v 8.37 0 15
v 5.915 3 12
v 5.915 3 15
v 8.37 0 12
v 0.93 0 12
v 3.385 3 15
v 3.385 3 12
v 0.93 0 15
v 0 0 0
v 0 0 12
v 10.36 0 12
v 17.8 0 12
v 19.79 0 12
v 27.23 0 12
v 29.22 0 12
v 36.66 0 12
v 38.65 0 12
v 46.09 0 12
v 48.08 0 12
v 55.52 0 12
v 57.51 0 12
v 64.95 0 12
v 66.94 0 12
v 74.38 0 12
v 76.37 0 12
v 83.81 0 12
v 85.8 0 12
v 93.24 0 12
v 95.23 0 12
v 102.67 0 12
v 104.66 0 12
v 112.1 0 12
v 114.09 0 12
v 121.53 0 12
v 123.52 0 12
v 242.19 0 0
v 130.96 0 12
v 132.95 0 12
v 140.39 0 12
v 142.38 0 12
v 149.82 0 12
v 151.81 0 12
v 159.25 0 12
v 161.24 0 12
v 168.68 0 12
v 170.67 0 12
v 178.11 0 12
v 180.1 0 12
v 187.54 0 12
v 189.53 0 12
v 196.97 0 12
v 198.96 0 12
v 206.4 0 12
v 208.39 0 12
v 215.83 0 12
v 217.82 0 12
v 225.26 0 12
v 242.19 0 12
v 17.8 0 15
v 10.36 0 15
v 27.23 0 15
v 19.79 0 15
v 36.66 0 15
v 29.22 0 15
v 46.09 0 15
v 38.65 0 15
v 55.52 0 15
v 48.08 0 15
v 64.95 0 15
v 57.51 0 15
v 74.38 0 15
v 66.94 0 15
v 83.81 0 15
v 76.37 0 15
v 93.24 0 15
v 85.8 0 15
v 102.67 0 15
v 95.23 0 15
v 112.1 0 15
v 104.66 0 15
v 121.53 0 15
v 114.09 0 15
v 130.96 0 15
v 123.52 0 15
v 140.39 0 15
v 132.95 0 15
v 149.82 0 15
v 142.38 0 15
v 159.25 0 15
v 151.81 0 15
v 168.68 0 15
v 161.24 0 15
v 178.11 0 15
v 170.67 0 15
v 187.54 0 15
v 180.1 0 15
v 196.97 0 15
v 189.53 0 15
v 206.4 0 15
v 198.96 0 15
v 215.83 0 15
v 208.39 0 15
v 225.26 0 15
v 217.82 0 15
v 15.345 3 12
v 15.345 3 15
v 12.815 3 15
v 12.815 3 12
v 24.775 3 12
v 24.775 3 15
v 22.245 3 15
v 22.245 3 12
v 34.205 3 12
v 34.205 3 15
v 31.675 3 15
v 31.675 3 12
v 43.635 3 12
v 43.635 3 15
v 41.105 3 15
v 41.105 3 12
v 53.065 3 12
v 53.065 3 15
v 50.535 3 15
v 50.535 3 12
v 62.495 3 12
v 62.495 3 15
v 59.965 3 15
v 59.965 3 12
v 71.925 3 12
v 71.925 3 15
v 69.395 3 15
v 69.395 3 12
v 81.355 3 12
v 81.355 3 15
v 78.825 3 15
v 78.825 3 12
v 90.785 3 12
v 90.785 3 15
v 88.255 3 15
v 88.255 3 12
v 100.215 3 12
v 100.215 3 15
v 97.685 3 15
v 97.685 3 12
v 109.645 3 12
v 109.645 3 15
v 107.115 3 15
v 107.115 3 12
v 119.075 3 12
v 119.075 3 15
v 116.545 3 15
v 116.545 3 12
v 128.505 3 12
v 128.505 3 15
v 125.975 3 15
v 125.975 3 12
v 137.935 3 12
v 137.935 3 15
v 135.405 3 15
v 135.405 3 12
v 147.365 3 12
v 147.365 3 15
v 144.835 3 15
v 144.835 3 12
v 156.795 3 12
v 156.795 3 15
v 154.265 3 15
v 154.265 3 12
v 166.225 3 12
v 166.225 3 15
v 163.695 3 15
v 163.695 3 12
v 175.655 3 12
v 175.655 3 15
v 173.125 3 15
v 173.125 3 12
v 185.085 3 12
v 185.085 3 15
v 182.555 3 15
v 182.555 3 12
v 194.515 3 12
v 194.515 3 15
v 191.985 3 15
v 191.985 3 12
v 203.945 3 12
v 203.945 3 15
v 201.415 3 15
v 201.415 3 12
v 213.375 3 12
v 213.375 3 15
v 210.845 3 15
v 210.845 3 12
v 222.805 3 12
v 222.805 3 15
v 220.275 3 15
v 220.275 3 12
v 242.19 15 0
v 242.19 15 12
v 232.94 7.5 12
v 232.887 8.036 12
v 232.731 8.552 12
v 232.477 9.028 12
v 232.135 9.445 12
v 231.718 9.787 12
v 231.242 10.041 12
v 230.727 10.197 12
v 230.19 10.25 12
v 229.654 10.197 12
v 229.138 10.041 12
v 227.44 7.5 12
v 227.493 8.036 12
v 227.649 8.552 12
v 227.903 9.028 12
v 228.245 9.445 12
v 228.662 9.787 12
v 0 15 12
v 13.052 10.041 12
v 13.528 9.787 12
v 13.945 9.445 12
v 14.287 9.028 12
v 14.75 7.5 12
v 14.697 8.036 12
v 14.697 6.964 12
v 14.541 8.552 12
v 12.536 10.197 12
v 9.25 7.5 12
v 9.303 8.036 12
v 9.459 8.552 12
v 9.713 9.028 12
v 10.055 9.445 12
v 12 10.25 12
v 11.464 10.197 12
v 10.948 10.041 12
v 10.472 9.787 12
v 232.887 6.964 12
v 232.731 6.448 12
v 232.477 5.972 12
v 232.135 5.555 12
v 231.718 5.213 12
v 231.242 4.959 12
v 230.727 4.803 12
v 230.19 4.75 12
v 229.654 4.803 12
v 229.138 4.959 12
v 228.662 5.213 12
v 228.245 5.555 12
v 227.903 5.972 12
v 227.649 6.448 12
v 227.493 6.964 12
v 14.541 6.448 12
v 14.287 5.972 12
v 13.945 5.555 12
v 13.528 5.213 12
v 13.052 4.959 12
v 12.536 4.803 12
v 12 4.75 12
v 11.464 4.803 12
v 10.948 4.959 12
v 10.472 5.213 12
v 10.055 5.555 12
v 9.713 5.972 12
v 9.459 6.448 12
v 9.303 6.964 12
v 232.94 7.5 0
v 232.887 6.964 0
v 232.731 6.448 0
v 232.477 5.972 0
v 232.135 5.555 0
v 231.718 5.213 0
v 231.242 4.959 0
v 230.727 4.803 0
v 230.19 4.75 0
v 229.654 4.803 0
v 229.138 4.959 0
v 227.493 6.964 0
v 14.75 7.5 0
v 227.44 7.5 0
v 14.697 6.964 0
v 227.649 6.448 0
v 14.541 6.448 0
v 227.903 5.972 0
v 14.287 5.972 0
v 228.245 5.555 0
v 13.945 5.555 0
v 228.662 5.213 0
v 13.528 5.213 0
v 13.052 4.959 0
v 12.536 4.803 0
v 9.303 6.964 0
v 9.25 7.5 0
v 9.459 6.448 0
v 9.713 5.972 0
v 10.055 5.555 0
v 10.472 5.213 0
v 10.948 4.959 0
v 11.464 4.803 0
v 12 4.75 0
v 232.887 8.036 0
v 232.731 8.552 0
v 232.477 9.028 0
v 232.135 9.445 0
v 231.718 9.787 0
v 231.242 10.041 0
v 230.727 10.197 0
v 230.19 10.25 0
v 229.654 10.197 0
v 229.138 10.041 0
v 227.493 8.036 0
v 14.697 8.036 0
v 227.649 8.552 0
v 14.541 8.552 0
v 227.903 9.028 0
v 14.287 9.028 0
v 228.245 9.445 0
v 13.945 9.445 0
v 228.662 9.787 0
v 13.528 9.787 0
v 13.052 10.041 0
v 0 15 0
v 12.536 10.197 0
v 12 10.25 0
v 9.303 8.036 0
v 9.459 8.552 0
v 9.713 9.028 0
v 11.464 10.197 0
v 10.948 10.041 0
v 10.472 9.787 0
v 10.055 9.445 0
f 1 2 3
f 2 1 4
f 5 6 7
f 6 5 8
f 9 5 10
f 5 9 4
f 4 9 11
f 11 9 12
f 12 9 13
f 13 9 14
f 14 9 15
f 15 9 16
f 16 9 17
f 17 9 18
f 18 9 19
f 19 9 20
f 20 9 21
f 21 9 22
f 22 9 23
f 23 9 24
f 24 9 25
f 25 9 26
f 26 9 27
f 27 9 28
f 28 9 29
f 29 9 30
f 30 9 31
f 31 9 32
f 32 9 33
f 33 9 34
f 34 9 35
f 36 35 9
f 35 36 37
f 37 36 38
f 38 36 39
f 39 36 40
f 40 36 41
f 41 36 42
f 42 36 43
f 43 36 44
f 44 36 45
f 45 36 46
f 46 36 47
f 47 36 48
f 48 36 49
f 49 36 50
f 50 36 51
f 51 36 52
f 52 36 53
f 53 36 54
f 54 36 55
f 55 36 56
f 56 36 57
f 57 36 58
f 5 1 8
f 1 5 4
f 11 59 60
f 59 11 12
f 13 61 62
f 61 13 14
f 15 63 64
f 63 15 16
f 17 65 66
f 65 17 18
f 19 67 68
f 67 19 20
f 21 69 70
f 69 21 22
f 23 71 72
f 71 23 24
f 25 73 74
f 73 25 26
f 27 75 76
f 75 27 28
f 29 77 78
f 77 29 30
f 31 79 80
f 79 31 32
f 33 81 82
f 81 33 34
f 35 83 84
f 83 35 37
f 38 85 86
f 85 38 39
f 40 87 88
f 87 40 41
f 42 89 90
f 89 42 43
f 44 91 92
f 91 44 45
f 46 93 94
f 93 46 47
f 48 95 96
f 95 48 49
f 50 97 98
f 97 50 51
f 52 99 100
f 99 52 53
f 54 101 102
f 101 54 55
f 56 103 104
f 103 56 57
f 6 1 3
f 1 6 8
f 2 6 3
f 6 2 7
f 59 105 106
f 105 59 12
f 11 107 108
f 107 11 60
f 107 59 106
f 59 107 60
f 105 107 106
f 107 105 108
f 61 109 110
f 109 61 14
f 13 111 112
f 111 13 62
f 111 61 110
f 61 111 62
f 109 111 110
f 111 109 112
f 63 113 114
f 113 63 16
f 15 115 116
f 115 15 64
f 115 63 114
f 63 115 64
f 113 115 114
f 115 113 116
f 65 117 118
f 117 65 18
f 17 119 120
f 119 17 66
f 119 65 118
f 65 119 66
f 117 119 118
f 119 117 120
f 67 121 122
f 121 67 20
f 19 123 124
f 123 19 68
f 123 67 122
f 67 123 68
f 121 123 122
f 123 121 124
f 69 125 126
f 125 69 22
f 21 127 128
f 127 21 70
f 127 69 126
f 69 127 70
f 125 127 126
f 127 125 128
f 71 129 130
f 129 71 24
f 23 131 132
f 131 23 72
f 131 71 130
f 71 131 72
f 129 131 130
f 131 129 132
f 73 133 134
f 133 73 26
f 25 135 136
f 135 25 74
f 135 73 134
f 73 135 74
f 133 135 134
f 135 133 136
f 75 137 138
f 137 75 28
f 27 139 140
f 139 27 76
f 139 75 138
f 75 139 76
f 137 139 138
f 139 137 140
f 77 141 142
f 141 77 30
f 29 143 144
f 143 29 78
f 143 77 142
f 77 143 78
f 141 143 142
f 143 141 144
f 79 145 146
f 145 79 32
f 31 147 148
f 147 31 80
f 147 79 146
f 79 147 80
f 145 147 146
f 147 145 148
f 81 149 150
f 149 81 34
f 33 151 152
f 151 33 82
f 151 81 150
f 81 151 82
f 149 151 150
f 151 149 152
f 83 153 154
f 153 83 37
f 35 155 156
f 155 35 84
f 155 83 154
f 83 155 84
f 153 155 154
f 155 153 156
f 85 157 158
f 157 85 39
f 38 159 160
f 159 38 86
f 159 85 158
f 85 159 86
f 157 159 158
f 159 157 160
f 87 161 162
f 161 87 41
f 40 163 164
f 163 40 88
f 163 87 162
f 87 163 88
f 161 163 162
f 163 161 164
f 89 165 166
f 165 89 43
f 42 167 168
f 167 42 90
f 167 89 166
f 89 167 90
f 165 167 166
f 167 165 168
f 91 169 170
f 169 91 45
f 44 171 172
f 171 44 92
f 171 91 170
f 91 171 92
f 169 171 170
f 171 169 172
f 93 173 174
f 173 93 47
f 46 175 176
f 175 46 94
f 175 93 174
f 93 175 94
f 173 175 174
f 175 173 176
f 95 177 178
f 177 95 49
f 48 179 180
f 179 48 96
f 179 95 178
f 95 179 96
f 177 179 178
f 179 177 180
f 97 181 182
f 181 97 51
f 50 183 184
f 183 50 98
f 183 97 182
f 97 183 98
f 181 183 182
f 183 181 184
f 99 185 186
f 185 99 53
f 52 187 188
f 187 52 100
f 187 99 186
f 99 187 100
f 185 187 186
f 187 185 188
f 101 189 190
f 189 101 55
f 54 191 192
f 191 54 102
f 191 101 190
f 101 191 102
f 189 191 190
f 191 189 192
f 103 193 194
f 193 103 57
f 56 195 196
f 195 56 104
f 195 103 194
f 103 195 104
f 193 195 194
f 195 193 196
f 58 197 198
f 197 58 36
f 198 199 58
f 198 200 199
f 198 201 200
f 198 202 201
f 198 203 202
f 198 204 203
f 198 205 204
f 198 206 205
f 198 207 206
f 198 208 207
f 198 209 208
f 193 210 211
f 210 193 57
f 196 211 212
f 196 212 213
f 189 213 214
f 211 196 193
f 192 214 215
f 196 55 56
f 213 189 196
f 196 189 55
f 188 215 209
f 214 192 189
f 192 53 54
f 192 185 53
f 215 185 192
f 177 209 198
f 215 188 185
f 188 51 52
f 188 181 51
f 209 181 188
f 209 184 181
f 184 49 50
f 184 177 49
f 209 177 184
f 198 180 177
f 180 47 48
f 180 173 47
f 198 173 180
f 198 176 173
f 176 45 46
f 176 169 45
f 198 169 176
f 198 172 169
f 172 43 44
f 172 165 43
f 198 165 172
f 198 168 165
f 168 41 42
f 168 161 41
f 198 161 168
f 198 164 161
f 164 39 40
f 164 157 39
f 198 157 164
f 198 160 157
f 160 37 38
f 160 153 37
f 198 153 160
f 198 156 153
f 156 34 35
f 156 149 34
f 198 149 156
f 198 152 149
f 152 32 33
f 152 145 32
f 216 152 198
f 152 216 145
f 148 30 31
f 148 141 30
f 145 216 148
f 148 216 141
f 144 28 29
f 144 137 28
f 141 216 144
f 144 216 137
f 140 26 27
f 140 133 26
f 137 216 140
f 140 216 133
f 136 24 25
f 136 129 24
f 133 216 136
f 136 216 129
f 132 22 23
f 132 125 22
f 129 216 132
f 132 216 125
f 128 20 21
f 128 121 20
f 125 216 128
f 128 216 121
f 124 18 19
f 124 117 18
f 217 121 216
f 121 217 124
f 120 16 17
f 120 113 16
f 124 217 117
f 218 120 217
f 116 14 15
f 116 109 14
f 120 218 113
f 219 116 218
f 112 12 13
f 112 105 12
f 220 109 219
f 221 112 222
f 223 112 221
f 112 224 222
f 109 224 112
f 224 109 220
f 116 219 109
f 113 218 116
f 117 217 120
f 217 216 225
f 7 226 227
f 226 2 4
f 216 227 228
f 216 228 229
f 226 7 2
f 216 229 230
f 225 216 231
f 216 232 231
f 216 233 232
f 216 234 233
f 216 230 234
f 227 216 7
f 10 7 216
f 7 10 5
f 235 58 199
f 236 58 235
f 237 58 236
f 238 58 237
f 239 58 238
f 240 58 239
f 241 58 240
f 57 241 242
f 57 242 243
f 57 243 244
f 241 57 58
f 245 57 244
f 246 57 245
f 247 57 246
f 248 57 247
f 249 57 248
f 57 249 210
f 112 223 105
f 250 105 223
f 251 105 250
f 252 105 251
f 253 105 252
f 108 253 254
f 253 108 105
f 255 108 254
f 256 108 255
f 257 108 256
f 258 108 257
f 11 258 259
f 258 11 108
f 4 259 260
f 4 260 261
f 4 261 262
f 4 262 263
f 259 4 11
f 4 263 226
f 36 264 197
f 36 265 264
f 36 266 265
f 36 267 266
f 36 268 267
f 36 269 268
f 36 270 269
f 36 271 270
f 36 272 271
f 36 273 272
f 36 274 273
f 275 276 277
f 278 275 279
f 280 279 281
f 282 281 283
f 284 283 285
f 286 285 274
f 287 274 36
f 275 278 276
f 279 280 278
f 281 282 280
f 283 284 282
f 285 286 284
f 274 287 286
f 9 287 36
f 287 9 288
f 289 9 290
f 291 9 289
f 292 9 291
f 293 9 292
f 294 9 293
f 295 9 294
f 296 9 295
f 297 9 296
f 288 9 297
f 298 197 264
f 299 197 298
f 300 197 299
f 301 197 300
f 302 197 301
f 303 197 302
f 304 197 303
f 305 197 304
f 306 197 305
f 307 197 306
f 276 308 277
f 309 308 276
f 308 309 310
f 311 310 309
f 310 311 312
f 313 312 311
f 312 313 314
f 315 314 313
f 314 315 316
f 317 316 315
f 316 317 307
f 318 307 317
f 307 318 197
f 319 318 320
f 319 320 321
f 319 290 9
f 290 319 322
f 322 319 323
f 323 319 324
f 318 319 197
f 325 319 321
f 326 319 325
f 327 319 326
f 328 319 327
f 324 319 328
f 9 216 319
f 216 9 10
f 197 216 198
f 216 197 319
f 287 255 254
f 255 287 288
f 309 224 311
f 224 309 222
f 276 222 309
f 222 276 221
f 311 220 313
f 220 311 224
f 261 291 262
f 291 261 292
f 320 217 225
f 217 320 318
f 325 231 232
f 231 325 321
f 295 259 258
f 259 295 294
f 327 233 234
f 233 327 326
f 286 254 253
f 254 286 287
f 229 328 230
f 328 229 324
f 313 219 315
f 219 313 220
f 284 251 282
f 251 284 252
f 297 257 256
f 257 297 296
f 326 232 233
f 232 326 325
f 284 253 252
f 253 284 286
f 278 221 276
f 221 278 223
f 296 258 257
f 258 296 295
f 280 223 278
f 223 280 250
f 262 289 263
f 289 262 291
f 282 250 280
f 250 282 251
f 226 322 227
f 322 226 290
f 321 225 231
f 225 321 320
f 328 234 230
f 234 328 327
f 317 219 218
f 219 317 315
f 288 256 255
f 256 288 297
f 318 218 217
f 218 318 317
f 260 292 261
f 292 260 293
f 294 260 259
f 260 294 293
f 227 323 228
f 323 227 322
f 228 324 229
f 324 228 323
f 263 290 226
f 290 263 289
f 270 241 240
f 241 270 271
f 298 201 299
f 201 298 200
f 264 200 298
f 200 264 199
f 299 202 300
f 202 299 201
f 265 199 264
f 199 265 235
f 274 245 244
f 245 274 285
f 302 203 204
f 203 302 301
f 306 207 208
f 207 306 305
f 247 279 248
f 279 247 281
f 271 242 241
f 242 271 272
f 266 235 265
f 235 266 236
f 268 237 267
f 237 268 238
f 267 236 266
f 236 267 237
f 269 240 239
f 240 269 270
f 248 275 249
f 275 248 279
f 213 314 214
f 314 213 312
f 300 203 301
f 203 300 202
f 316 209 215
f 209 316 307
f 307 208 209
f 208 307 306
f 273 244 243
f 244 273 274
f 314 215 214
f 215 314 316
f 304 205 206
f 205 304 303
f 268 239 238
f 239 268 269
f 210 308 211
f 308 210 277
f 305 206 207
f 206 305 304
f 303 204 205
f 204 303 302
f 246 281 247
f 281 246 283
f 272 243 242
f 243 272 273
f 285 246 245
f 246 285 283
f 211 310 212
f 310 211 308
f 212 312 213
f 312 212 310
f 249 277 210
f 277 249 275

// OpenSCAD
$fn = 32;

// ----------------------------------------------------------------------
// Gear rack: m=3 z=24, 242.19 x 15 x 15 mm
// ----------------------------------------------------------------------

// --- parameters (mm) ---
rack_len = 242.19;        // rack length, X
rack_w = 15;              // rack width, Y
rack_h = 15;              // overall height, Z
modul = 3;                // module
body_t = 12;              // tooth root line height
pitch = 9.43;             // circular pitch
tip_w = 2.53;             // tooth thickness at the tip
root_w = 7.44;            // tooth thickness at the root line
hole_d = 5.5;             // mounting hole
sink = 0.6;               // tooth root overlap into the body

tooth_span = 226.19;

module tooth(x0) {
  /* 20 deg flank profile, sunk into the body for a positive overlap */
  translate([x0, 0, body_t - sink])
    linear_extrude(height = rack_h - body_t + sink)
      polygon(points = [[-root_w / 2, 0], [root_w / 2, 0],
                        [tip_w / 2, rack_h - body_t],
                        [-tip_w / 2, rack_h - body_t]]);
}

difference() {
  union() {
    cube([rack_len, rack_w, body_t]);
    for (i = [0 : 24 - 1])
      tooth((i + 0.5) * pitch + (tooth_span - 24 * pitch) / 2);
  }
  translate([12, 7.5, -1]) cylinder(h = body_t + 2, d = hole_d);
  translate([230.19, 7.5, -1]) cylinder(h = body_t + 2, d = hole_d);
}
